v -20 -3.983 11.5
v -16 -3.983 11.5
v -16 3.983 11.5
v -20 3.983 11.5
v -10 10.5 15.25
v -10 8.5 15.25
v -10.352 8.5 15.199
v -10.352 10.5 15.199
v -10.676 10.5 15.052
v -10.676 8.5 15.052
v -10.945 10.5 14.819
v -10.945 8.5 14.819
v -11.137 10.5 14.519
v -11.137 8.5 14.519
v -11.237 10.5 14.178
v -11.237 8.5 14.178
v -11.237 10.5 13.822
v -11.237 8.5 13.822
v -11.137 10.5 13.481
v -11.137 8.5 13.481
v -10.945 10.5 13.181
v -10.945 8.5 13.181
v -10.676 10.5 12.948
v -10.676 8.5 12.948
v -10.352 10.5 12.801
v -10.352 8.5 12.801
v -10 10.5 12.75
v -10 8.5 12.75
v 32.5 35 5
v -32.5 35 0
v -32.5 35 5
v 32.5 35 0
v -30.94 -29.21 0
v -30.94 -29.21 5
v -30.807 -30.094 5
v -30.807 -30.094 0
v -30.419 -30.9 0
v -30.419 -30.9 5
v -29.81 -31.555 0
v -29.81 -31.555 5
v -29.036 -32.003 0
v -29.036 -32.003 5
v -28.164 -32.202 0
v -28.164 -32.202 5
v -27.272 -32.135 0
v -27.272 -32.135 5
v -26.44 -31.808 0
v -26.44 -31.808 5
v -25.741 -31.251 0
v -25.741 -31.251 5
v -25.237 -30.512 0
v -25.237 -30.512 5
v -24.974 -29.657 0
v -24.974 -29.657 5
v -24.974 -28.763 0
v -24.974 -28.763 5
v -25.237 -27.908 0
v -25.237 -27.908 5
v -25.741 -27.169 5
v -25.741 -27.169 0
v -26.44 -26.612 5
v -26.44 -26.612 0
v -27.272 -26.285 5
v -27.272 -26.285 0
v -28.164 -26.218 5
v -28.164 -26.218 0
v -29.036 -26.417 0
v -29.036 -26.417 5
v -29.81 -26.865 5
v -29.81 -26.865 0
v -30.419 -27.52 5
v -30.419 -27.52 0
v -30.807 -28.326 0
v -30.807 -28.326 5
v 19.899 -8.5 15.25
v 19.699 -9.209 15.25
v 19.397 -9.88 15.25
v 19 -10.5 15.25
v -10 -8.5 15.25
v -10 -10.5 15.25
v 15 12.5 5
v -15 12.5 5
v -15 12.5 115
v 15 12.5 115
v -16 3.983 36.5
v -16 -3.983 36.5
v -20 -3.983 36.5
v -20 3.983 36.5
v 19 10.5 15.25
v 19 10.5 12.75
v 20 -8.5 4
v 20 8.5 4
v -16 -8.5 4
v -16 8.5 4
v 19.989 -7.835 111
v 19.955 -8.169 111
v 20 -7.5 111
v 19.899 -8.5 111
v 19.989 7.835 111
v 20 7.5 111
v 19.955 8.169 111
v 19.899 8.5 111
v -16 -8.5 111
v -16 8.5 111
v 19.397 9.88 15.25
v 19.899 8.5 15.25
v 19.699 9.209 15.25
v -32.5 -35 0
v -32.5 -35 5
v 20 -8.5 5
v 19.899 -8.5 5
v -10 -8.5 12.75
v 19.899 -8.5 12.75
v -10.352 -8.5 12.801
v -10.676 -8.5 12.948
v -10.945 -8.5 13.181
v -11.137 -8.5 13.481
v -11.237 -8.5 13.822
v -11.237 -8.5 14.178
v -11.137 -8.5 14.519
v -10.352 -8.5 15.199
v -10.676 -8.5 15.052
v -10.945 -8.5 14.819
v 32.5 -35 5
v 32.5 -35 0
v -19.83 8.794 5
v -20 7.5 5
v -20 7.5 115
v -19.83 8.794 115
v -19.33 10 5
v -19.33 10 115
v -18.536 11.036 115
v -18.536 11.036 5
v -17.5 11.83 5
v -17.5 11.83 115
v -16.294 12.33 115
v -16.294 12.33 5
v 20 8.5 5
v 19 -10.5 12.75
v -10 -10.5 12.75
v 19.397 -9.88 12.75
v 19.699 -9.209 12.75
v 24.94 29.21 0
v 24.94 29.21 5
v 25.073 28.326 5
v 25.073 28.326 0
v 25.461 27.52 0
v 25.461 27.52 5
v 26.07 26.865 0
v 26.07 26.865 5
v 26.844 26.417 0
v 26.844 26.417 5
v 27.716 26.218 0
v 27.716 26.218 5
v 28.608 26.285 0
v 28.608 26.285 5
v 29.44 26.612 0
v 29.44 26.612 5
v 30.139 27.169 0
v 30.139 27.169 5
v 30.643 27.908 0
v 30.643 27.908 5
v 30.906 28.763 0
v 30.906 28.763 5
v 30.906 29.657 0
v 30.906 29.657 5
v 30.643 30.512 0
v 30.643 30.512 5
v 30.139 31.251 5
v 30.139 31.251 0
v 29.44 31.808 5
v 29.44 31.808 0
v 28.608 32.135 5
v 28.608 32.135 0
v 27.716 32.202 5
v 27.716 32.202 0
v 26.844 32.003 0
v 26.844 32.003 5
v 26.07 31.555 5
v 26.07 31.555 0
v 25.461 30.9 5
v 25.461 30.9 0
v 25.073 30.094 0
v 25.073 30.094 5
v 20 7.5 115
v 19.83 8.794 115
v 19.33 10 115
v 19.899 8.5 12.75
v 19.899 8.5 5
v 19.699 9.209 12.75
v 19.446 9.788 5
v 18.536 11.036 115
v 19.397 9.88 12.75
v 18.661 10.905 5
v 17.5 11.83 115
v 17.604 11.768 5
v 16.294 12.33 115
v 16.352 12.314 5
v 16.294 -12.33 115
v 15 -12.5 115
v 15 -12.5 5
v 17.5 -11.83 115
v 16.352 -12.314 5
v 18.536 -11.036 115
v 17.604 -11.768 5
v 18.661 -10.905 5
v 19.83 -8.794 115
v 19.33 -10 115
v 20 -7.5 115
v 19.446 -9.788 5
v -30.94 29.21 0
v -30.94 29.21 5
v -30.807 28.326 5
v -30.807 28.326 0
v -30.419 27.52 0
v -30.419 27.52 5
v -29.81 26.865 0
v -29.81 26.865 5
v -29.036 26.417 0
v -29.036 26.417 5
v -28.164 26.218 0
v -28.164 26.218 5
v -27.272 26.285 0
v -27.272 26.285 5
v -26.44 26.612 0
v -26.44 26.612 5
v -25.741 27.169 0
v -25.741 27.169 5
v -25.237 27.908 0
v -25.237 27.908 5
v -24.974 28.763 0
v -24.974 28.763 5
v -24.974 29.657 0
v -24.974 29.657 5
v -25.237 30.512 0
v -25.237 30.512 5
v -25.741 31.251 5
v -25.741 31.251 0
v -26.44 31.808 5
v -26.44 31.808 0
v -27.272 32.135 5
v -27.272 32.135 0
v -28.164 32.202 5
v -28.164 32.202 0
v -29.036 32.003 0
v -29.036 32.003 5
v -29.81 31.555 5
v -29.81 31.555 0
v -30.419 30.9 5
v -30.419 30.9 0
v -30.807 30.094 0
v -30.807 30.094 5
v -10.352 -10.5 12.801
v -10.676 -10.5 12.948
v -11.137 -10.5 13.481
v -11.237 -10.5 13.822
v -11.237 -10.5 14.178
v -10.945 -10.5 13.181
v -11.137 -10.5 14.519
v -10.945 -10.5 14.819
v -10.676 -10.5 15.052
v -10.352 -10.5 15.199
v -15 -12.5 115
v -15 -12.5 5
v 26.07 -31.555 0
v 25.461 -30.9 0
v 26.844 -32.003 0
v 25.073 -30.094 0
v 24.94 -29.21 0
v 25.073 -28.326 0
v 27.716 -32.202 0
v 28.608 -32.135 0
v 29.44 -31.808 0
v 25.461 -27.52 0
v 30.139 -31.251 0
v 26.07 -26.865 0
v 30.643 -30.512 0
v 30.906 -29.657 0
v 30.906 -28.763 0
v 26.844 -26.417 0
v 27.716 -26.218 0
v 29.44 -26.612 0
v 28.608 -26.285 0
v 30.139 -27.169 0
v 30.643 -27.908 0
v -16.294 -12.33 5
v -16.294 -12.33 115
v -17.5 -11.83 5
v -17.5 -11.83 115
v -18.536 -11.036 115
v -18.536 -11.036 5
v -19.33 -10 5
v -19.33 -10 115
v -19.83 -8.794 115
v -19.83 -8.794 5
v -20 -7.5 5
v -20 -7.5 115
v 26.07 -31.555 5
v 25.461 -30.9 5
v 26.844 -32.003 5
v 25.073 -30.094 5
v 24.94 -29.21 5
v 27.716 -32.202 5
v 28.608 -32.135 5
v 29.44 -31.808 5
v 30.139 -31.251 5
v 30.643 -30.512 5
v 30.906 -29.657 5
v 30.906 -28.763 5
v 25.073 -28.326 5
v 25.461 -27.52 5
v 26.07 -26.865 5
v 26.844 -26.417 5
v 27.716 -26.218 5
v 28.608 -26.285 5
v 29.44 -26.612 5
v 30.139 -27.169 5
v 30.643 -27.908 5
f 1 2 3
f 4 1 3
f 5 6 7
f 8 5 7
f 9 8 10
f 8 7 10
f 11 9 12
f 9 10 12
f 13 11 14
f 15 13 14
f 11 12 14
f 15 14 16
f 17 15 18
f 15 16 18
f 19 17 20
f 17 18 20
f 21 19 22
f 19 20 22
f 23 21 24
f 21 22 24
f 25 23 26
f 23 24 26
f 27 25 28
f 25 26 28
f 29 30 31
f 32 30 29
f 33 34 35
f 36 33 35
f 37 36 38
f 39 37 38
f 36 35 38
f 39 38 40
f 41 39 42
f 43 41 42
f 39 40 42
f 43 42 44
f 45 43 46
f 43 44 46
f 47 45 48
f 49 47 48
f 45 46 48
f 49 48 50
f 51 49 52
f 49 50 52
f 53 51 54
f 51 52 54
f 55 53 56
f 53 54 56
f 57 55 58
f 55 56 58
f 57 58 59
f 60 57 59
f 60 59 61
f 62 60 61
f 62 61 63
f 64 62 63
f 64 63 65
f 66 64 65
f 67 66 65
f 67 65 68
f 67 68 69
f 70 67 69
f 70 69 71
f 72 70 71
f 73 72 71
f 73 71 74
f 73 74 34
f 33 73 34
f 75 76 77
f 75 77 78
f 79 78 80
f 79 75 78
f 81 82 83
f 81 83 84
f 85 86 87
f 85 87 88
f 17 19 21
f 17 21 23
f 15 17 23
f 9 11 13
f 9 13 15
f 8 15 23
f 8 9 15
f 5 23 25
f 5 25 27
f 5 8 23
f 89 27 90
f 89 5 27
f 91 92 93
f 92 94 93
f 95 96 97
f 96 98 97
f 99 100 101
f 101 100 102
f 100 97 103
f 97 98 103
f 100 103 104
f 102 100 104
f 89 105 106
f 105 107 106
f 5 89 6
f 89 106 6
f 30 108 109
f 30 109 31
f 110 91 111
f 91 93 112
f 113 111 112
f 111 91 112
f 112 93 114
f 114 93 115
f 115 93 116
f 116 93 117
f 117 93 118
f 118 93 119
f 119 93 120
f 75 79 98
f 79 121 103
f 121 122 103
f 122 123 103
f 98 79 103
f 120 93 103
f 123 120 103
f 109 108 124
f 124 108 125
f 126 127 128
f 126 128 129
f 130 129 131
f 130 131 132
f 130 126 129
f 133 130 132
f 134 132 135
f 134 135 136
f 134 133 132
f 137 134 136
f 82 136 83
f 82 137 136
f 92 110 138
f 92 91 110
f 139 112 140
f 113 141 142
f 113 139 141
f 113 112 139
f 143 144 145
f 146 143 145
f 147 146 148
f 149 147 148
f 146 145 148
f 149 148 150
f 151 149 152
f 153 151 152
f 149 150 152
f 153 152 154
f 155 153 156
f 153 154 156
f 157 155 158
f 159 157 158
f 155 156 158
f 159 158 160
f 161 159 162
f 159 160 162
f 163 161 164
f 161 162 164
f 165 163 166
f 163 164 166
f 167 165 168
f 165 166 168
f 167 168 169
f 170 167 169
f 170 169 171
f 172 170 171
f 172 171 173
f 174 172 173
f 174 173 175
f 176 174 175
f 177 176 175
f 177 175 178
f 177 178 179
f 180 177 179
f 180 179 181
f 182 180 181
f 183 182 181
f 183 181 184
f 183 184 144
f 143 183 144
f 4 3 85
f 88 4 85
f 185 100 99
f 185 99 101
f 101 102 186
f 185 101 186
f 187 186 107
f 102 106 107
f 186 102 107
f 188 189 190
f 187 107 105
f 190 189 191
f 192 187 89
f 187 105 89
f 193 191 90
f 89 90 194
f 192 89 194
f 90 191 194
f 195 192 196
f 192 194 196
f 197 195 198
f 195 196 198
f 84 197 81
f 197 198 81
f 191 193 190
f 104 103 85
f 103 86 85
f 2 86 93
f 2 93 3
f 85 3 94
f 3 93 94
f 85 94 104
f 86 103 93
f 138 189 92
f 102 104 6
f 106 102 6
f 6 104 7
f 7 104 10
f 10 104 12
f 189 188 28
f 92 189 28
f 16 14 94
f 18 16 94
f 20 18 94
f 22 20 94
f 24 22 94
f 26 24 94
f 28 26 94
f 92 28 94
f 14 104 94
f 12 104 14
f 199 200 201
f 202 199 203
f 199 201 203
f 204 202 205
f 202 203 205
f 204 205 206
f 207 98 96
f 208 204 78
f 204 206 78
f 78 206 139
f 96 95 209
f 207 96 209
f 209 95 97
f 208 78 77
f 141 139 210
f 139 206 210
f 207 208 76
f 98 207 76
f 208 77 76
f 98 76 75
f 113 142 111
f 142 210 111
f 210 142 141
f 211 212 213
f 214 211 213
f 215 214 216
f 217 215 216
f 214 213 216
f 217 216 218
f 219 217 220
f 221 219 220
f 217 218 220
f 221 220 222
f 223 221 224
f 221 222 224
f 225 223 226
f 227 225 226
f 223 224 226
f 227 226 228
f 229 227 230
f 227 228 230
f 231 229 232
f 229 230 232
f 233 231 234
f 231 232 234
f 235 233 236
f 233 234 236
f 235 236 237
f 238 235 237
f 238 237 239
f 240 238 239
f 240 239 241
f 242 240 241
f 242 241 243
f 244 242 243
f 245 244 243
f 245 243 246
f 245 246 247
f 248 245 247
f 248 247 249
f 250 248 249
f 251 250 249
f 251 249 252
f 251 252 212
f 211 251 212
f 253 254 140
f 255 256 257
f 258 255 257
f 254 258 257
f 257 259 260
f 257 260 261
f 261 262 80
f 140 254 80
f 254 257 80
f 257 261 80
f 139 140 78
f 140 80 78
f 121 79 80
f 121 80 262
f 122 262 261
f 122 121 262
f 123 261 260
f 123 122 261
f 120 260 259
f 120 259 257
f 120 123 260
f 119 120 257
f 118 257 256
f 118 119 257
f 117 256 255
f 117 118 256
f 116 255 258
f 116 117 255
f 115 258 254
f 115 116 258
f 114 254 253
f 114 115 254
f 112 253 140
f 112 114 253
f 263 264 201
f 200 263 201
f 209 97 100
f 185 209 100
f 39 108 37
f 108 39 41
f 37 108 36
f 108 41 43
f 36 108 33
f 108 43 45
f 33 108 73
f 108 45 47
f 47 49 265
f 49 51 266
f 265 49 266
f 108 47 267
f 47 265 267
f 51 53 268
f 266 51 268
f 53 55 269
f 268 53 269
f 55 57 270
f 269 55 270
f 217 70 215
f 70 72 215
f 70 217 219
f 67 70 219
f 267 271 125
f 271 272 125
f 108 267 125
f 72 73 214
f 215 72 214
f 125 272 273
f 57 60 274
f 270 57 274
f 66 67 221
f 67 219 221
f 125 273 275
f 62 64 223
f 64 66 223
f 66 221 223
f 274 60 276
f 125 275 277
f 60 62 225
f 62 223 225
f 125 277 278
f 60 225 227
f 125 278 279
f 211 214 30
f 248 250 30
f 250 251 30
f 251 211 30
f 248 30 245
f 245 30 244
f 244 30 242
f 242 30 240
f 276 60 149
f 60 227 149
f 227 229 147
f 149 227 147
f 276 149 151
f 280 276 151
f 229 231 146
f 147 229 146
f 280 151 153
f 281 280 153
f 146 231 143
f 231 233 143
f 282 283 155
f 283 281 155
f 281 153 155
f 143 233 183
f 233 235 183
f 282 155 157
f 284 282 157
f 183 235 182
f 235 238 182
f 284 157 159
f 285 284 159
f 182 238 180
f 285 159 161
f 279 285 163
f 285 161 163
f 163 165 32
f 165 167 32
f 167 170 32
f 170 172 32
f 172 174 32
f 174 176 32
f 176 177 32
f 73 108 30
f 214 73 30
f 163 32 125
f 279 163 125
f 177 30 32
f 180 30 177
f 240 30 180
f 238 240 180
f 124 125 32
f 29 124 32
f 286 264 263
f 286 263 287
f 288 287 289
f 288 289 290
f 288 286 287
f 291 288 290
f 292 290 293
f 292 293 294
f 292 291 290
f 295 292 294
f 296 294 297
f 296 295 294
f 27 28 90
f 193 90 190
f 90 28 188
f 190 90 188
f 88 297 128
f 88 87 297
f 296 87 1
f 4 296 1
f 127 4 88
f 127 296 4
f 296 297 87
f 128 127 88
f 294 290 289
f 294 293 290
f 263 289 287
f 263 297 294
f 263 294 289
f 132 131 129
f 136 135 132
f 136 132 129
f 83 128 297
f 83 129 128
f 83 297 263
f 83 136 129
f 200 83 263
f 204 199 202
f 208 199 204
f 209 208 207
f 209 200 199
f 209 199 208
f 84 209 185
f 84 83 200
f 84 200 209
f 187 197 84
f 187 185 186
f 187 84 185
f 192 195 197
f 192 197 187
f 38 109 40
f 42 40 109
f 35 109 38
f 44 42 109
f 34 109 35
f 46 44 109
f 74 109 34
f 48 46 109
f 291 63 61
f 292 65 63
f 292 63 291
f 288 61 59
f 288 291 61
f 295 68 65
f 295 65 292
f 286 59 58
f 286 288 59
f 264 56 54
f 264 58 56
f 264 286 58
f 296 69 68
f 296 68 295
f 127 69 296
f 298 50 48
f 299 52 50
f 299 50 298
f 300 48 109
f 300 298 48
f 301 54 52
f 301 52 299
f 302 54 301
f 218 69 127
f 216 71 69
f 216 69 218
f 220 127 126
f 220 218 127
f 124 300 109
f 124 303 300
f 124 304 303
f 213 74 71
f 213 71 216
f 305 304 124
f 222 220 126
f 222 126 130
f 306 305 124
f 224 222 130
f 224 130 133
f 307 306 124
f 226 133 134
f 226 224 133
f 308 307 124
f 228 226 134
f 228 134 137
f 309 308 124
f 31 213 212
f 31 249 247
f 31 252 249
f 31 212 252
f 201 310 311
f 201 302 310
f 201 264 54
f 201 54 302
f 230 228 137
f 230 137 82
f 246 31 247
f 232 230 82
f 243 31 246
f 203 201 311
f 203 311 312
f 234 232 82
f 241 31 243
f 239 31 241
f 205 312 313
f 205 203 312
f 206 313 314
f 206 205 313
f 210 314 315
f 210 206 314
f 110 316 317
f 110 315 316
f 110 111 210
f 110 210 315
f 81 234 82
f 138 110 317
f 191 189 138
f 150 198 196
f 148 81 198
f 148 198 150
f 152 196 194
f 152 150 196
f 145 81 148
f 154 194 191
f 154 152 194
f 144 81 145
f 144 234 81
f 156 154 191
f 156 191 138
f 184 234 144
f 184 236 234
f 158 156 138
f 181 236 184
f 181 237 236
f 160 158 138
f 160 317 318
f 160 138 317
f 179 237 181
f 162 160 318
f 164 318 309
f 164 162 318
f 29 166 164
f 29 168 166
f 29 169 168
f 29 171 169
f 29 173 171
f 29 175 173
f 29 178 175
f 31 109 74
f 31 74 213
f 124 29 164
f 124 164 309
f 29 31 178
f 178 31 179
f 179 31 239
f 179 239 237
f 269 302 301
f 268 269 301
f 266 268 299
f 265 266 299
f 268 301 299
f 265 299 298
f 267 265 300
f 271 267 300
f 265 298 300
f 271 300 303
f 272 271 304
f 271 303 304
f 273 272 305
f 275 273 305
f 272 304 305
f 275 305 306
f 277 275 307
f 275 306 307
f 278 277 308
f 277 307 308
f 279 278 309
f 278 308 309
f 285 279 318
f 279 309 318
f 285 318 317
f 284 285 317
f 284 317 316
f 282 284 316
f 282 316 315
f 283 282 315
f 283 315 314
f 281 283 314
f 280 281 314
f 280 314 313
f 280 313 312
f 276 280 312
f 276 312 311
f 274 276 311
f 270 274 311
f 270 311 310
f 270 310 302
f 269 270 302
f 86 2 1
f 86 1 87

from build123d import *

# Parameters (mm, degrees)
F0_W         = 65
F0_H         = 70
F1_DEPTH     = 5
F2_W         = 40
F2_H         = 25
F3_DEPTH     = 110
F5_D         = 6
F6_T         = -4
F7_W         = 7.9657556489
F7_H         = 25
F8_DEPTH     = 25
F10_DEPTH    = 2
F11_T1_DEPTH = 122.5


# Not quite as in the source:
# - a fillet or chamfer that OpenCascade refuses, or shapes differently, is made with other operations: its cross-section is extruded or revolved along the edge and cut away or added
# - a pattern or mirror of a feature is missing from the dataset's text; its kind, count and spacing are read off the source's solid


with BuildPart() as f1:
    # F0 (on Top) → F1 (new body)
    with BuildSketch(Plane.XY):
        Rectangle(F0_W, F0_H)
    extrude(amount=F1_DEPTH)

    # F2 (on face) → F3 (join)
    with BuildSketch(Plane.XY.offset(5)):
        Rectangle(F2_W, F2_H)
    extrude(amount=F3_DEPTH)

    # F5 (through all)
    with Locations(Plane(origin=(0, 0, 0), x_dir=(1, 0, 0), z_dir=(0, 0, -1))):
        with Locations((-27.94, 29.21), (27.94, 29.21), (27.94, -29.21), (-27.94, -29.21)):
            Hole(F5_D / 2)

    # F6: a shell. OpenCascade refuses it in one call, so the cavity is built on its own and cut out:
    # the body offset inwards by the wall thickness, plus a prism from it out through each open face.
    f6_core = offset(f1.part, amount=F6_T, kind=Kind.INTERSECTION, mode=Mode.PRIVATE)
    f6_exits = [f6_core.faces().sort_by_distance(p)[0] for p in [
        (16, 0, 57.5),
    ]]
    add(f6_core, mode=Mode.SUBTRACT)
    extrude(f6_exits, amount=-F6_T, mode=Mode.SUBTRACT)

    # F7 (on face) → F8 (cut)
    with BuildSketch(Plane.YZ.offset(-16)):
        with Locations((0, 24)):
            Rectangle(F7_W, F7_H)
    extrude(amount=-F8_DEPTH, mode=Mode.SUBTRACT)

    # F9 (on face) → F10 (cut)
    with BuildSketch(Plane.XZ.offset(-8.5)):
        with BuildLine():
            Line((20, 14), (20, 15.25))
            Line((20, 15.25), (-10, 15.25))
            ThreePointArc((-10, 15.25), (-11.25, 14), (-10, 12.75))
            Line((-10, 12.75), (20, 12.75))
            Line((20, 12.75), (20, 14))
        make_face()
    f10 = extrude(amount=-F10_DEPTH, mode=Mode.SUBTRACT)

    # F10_copies: F10 across plane
    add(f10.mirror(Plane(origin=(0, 0, 0), x_dir=(0, 0, -1), z_dir=(0, -1, 0))), mode=Mode.SUBTRACT)

    # F11: fillet of radius 5 on 4 edges, made by hand

    # F11_s2 → F11_t1 (cut)
    with BuildSketch(Plane.XY.offset(5)):
        with BuildLine():
            ThreePointArc((-15, -12.5), (-18.5355339059, -11.0355339059), (-20, -7.5))
            Line((-20, -7.5), (-20, -12.5))
            Line((-20, -12.5), (-15, -12.5))
        make_face()
        with BuildLine():
            ThreePointArc((-20, 7.5), (-18.5355339059, 11.0355339059), (-15, 12.5))
            Line((-15, 12.5), (-20, 12.5))
            Line((-20, 12.5), (-20, 7.5))
        make_face()
        with BuildLine():
            ThreePointArc((15, -12.5), (18.5355339059, -11.0355339059), (20, -7.5))
            Line((20, -7.5), (20, -12.5))
            Line((20, -12.5), (15, -12.5))
        make_face()
        with BuildLine():
            ThreePointArc((20, 7.5), (18.5355339059, 11.0355339059), (15, 12.5))
            Line((15, 12.5), (20, 12.5))
            Line((20, 12.5), (20, 7.5))
        make_face()
    extrude(amount=F11_T1_DEPTH, mode=Mode.SUBTRACT)


solid = f1.part
